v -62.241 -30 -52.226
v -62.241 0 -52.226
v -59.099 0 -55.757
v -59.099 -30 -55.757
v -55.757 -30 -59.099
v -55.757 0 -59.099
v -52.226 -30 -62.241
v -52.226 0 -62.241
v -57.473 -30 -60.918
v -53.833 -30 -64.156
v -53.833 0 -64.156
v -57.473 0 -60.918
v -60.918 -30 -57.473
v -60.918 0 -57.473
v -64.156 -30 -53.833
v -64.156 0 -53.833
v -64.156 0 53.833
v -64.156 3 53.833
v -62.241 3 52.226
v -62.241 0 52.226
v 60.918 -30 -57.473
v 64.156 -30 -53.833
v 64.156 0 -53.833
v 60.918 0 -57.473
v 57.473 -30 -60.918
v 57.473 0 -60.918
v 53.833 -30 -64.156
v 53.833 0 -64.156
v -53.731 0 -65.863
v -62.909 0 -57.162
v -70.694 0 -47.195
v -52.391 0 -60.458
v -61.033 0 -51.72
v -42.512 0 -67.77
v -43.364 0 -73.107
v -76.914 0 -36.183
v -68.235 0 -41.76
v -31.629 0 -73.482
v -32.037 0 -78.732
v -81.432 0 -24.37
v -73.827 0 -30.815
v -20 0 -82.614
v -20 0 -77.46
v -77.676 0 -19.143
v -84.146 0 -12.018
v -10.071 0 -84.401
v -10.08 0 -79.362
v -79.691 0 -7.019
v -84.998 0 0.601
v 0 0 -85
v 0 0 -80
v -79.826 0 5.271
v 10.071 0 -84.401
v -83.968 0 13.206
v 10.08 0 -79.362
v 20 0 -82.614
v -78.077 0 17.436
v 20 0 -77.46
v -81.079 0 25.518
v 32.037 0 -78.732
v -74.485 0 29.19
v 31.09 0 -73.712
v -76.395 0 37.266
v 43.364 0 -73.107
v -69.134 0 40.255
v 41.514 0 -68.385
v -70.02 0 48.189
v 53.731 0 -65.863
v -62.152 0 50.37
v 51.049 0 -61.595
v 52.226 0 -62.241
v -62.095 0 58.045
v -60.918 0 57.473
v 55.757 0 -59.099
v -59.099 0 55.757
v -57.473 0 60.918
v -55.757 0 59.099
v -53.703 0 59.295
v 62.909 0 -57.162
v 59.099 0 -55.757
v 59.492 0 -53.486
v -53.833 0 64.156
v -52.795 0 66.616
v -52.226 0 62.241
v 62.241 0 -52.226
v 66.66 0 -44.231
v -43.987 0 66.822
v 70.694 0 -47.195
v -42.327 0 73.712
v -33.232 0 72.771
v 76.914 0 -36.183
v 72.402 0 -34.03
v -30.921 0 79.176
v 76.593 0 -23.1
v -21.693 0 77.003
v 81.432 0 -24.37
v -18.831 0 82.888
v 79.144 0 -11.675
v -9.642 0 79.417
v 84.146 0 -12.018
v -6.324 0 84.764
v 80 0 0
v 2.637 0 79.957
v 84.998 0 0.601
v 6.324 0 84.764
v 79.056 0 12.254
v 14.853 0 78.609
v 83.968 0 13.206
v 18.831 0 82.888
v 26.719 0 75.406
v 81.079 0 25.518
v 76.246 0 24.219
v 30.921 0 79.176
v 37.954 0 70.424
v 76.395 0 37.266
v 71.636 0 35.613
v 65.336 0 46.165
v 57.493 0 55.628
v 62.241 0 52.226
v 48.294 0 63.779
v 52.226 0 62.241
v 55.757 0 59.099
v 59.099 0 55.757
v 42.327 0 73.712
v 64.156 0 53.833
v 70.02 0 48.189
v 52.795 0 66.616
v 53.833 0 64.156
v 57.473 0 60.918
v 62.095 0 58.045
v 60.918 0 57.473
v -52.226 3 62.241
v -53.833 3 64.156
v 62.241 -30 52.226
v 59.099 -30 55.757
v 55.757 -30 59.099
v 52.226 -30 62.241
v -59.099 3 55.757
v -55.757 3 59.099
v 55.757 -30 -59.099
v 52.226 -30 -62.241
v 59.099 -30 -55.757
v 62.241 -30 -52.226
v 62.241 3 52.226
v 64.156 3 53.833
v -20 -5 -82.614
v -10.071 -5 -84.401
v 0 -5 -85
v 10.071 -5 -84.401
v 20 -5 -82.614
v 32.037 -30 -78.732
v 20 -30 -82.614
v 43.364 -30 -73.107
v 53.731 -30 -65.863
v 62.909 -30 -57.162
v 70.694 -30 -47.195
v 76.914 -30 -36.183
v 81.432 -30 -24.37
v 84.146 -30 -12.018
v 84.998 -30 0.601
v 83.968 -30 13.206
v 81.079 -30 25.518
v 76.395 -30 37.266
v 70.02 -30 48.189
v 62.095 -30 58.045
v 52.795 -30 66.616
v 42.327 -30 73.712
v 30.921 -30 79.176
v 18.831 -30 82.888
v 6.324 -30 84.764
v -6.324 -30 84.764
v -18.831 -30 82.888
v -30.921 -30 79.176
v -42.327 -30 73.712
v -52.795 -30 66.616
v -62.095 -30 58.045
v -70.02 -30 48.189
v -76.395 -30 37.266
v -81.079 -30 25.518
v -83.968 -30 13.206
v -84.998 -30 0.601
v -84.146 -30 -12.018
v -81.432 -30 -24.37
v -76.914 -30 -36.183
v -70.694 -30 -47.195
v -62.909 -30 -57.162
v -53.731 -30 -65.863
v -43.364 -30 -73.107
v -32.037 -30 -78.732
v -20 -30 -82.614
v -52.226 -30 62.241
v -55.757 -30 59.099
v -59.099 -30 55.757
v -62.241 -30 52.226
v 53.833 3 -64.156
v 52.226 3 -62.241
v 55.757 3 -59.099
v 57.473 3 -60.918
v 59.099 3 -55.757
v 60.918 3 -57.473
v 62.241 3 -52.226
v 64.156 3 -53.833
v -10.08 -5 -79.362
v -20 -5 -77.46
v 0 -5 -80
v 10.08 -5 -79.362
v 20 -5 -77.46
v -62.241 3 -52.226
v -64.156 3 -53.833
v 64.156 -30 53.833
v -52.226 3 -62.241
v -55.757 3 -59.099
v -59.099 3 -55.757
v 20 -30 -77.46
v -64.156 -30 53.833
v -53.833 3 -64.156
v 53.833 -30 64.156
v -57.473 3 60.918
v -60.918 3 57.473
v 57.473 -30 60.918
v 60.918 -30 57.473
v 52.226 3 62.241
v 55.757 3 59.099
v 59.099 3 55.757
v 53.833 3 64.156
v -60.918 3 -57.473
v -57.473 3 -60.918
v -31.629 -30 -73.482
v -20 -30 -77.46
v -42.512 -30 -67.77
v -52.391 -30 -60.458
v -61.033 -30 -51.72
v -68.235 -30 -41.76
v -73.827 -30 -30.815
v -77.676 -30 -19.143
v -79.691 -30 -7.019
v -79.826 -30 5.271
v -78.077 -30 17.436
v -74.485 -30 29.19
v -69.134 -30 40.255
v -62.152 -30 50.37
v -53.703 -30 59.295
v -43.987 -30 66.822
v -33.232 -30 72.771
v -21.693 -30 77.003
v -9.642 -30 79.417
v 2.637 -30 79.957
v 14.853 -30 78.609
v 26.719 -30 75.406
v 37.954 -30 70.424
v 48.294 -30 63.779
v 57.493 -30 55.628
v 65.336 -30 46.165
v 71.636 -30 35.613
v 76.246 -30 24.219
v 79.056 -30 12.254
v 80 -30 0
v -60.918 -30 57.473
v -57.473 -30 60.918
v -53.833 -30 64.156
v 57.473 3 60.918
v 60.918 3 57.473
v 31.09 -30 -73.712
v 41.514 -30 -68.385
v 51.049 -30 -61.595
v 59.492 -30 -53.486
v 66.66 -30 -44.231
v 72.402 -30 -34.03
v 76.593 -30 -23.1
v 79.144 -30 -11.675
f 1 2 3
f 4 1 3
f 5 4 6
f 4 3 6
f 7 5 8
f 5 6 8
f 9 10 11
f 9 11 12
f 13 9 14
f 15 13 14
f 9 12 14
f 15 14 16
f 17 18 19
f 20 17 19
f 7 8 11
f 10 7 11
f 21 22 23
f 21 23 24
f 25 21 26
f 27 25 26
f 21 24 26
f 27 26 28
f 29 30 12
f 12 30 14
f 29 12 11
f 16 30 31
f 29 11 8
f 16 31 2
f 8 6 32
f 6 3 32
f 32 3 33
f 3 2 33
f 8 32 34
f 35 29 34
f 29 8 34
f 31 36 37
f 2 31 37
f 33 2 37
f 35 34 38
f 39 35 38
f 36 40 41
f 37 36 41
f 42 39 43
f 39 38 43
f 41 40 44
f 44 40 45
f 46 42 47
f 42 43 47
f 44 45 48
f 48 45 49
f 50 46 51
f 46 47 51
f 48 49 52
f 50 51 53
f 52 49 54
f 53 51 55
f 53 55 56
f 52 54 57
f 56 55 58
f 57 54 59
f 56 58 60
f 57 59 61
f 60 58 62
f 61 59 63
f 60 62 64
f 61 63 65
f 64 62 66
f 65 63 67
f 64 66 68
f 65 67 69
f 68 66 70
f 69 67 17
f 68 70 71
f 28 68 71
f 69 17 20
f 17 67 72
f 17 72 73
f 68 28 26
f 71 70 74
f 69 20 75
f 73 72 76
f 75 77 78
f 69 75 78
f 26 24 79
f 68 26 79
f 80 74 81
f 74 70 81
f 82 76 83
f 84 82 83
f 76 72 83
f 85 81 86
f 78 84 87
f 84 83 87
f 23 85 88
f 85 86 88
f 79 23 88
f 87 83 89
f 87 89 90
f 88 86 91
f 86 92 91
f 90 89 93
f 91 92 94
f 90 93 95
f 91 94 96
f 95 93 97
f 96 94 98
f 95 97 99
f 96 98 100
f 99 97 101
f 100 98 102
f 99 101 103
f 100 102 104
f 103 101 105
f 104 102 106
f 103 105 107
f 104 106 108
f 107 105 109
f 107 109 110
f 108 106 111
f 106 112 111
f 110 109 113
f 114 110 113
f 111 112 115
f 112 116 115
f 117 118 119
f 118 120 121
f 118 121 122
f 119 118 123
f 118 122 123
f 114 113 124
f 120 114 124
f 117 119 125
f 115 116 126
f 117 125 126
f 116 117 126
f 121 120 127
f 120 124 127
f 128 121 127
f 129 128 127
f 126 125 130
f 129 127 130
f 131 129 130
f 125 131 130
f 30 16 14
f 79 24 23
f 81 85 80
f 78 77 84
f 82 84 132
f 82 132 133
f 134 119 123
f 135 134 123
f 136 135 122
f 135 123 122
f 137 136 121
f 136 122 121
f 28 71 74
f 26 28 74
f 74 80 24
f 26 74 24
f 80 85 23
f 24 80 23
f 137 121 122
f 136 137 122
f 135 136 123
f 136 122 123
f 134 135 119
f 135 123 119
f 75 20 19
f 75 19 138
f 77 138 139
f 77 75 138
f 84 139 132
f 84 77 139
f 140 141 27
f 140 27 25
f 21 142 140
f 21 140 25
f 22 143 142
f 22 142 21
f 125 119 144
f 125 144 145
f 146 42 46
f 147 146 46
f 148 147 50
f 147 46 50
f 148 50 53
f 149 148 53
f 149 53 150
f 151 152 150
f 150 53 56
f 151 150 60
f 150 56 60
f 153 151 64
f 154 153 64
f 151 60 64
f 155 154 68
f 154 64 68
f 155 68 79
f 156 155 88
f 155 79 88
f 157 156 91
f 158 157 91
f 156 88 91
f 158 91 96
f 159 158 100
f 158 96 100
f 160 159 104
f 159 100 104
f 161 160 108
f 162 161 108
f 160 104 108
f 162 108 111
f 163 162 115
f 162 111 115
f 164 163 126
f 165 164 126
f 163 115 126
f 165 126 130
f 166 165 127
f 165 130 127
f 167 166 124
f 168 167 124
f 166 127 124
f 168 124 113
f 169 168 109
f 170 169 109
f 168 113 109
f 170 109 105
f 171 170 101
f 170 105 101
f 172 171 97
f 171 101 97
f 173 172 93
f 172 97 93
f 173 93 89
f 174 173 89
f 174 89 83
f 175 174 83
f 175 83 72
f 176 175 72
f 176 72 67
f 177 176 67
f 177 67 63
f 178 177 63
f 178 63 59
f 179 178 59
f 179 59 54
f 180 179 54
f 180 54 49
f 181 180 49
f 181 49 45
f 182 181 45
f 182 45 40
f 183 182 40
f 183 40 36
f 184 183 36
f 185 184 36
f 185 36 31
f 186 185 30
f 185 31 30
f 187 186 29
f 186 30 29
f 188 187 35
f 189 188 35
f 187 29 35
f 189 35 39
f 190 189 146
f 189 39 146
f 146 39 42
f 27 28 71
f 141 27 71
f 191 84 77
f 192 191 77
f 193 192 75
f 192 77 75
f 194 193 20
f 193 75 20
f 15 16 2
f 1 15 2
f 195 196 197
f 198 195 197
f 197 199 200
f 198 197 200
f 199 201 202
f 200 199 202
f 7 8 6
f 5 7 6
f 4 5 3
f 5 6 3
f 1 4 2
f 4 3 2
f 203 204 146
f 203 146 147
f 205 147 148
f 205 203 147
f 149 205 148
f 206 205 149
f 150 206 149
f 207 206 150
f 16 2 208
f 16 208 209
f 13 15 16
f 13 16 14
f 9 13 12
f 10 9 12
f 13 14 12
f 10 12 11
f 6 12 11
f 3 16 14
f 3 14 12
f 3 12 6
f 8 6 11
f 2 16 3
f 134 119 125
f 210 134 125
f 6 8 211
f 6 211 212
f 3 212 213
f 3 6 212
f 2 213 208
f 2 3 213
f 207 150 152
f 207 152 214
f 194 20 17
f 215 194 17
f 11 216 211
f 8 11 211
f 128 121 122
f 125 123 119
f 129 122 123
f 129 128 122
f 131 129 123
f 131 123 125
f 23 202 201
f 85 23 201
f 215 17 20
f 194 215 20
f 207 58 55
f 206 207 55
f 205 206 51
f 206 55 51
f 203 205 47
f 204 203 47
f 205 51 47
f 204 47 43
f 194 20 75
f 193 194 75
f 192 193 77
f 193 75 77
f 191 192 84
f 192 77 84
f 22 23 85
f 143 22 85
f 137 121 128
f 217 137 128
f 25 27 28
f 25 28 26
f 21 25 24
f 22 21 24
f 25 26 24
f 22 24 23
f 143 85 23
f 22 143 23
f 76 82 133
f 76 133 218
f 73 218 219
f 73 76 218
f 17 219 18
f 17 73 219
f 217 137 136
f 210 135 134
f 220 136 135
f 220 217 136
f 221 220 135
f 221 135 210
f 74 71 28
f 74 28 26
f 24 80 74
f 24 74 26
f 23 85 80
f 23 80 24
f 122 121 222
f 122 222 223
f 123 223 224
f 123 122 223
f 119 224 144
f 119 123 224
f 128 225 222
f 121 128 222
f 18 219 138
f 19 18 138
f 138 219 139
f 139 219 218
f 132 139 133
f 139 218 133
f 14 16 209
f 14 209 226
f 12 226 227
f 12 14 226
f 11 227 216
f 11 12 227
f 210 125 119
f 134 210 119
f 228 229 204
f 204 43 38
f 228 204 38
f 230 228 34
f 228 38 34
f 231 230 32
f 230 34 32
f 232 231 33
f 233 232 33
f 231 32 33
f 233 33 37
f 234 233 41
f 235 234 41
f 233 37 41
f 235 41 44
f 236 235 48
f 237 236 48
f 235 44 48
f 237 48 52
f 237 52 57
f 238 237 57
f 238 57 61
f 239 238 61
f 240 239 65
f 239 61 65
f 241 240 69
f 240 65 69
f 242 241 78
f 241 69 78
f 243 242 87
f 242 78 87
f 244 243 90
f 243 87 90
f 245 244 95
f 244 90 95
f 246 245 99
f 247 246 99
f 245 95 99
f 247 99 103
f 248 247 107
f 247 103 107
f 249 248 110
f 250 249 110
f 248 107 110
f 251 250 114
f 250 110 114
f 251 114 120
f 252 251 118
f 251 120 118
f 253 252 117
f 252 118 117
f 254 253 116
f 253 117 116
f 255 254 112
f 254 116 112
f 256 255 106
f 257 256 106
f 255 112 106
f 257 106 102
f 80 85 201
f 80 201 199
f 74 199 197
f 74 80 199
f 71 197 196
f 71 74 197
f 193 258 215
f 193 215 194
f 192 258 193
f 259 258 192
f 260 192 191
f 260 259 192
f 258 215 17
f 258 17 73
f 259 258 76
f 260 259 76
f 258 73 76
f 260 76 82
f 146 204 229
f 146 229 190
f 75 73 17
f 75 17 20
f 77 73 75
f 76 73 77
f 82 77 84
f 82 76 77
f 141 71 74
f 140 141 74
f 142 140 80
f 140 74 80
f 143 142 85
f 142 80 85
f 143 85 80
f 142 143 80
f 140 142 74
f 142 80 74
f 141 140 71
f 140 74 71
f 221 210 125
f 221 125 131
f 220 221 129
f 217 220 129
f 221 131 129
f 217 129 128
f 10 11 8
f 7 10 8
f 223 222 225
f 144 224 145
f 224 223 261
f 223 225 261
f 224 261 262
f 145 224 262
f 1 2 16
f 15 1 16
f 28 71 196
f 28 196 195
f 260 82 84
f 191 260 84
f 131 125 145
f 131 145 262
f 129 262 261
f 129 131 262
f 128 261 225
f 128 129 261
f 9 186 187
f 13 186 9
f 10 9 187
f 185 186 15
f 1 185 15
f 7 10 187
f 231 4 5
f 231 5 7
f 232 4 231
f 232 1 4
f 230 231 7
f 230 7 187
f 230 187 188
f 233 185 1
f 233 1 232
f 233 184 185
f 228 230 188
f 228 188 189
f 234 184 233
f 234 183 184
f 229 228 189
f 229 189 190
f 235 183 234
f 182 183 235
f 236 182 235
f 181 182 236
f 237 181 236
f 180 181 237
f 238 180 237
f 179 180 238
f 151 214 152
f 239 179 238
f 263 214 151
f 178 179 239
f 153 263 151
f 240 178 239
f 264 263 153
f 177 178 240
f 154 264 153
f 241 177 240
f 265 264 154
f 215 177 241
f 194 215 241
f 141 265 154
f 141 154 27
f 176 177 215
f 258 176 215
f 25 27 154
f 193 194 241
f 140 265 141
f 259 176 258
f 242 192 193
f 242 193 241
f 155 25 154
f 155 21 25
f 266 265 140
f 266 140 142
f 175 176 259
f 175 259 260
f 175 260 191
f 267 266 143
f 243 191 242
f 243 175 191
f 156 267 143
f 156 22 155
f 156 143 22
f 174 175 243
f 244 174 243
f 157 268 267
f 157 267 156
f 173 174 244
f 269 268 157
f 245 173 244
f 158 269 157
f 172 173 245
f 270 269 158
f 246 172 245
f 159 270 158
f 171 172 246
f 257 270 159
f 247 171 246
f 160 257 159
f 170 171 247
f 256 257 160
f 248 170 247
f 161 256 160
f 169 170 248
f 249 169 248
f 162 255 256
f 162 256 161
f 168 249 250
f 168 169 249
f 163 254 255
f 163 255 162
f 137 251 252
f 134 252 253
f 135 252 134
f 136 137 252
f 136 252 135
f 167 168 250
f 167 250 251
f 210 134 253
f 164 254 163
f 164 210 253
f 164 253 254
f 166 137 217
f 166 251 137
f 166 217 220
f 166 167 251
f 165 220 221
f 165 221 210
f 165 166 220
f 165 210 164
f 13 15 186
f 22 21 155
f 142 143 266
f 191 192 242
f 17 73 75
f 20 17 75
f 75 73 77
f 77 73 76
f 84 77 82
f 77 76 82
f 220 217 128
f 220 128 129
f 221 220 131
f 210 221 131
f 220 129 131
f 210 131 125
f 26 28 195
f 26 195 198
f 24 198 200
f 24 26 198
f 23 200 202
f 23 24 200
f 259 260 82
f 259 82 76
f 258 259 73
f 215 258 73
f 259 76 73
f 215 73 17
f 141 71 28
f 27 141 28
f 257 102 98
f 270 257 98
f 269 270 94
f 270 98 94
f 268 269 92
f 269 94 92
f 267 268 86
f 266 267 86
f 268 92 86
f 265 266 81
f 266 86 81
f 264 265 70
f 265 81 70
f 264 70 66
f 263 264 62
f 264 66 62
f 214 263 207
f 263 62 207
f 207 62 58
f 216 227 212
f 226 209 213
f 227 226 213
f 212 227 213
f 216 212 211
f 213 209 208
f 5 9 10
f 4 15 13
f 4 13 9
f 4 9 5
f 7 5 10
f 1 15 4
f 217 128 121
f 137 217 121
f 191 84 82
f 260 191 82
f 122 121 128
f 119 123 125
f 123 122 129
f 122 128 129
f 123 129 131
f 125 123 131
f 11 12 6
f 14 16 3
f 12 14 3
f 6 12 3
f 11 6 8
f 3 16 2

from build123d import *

# Parameters (mm, degrees)
F1_DEPTH = 30
F2_DEPTH = 3
F3_DEPTH = 30
F4_DEPTH = 30
F5_DEPTH = 5


with BuildPart() as f1:
    # F0 (on Front) → F1 (new body)
    with BuildSketch(Plane.XZ):
        with BuildLine():
            ThreePointArc((-20, -77.4596669241), (-48.9897948557, 63.2455532034), (80, 0))
            ThreePointArc((80, 0), (63.2455532034, -48.9897948557), (20, -77.4596669241))
            Line((20, -77.4596669241), (20, -82.6135582093))
            ThreePointArc((20, -82.6135582093), (66.8019460794, -52.5594901041), (85, 0))
            ThreePointArc((85, 0), (-52.5594901041, 66.8019460794), (-20, -82.6135582093))
            Line((-20, -82.6135582093), (-20, -77.4596669241))
        make_face()
        with BuildLine():
            ThreePointArc((-53.8334623112, -64.1562221112), (-59.2201929244, -59.2201929244), (-64.1562221112, -53.8334623112))
            Line((-64.1562221112, -53.8334623112), (-62.2411110034, -52.226493287))
            ThreePointArc((-62.2411110034, -52.226493287), (-57.4524259714, -57.4524259714), (-52.226493287, -62.2411110034))
            Line((-52.226493287, -62.2411110034), (-53.8334623112, -64.1562221112))
        make_face(mode=Mode.SUBTRACT)
        with BuildLine():
            Line((53.8334623112, -64.1562221112), (52.226493287, -62.2411110034))
            ThreePointArc((52.226493287, -62.2411110034), (57.4524259714, -57.4524259714), (62.2411110034, -52.226493287))
            Line((62.2411110034, -52.226493287), (64.1562221112, -53.8334623112))
            ThreePointArc((64.1562221112, -53.8334623112), (59.2201929244, -59.2201929244), (53.8334623112, -64.1562221112))
        make_face(mode=Mode.SUBTRACT)
        with BuildLine():
            ThreePointArc((-64.1562221112, 53.8334623112), (-59.2201929244, 59.2201929244), (-53.8334623112, 64.1562221112))
            Line((-53.8334623112, 64.1562221112), (-52.226493287, 62.2411110034))
            ThreePointArc((-52.226493287, 62.2411110034), (-57.4524259714, 57.4524259714), (-62.2411110034, 52.226493287))
            Line((-62.2411110034, 52.226493287), (-64.1562221112, 53.8334623112))
        make_face(mode=Mode.SUBTRACT)
        with BuildLine():
            ThreePointArc((53.8334623112, 64.1562221112), (59.2201929244, 59.2201929244), (64.1562221112, 53.8334623112))
            Line((64.1562221112, 53.8334623112), (62.2411110034, 52.226493287))
            ThreePointArc((62.2411110034, 52.226493287), (57.4524259714, 57.4524259714), (52.226493287, 62.2411110034))
            Line((52.226493287, 62.2411110034), (53.8334623112, 64.1562221112))
        make_face(mode=Mode.SUBTRACT)
        with BuildLine():
            ThreePointArc((20, -77.4596669241), (0, -80), (-20, -77.4596669241))
            Line((-20, -77.4596669241), (-20, -82.6135582093))
            ThreePointArc((-20, -82.6135582093), (0, -85), (20, -82.6135582093))
            Line((20, -82.6135582093), (20, -77.4596669241))
        make_face()
    extrude(amount=F1_DEPTH)

    # F0 (on Front) → F4 (cut)
    with BuildSketch(Plane.XZ):
        with BuildLine():
            ThreePointArc((20, -77.4596669241), (0, -80), (-20, -77.4596669241))
            Line((-20, -77.4596669241), (-20, -82.6135582093))
            ThreePointArc((-20, -82.6135582093), (0, -85), (20, -82.6135582093))
            Line((20, -82.6135582093), (20, -77.4596669241))
        make_face()
    extrude(amount=F4_DEPTH, mode=Mode.SUBTRACT)

    # F0 (on Front) → F5 (join)
    with BuildSketch(Plane.XZ):
        with BuildLine():
            ThreePointArc((20, -77.4596669241), (0, -80), (-20, -77.4596669241))
            Line((-20, -77.4596669241), (-20, -82.6135582093))
            ThreePointArc((-20, -82.6135582093), (0, -85), (20, -82.6135582093))
            Line((20, -82.6135582093), (20, -77.4596669241))
        make_face()
    extrude(amount=F5_DEPTH)


with BuildPart() as f2:
    # F0 (on Front) → F2 (new body)
    with BuildSketch(Plane.XZ):
        with BuildLine():
            Line((-52.226493287, 62.2411110034), (-53.8334623112, 64.1562221112))
            ThreePointArc((-53.8334623112, 64.1562221112), (-59.2201929244, 59.2201929244), (-64.1562221112, 53.8334623112))
            Line((-64.1562221112, 53.8334623112), (-62.2411110034, 52.226493287))
            ThreePointArc((-62.2411110034, 52.226493287), (-57.4524259714, 57.4524259714), (-52.226493287, 62.2411110034))
        make_face()
    extrude(amount=-F2_DEPTH)


with BuildPart() as f2b:
    # F0 (on Front) → F2, piece 2 (new body)
    with BuildSketch(Plane.XZ):
        with BuildLine():
            Line((62.2411110034, 52.226493287), (64.1562221112, 53.8334623112))
            ThreePointArc((64.1562221112, 53.8334623112), (59.2201929244, 59.2201929244), (53.8334623112, 64.1562221112))
            Line((53.8334623112, 64.1562221112), (52.226493287, 62.2411110034))
            ThreePointArc((52.226493287, 62.2411110034), (57.4524259714, 57.4524259714), (62.2411110034, 52.226493287))
        make_face()
    extrude(amount=-F2_DEPTH)


with BuildPart() as f2c:
    # F0 (on Front) → F2, piece 3 (new body)
    with BuildSketch(Plane.XZ):
        with BuildLine():
            ThreePointArc((62.2411110034, -52.226493287), (57.4524259714, -57.4524259714), (52.226493287, -62.2411110034))
            Line((52.226493287, -62.2411110034), (53.8334623112, -64.1562221112))
            ThreePointArc((53.8334623112, -64.1562221112), (59.2201929244, -59.2201929244), (64.1562221112, -53.8334623112))
            Line((64.1562221112, -53.8334623112), (62.2411110034, -52.226493287))
        make_face()
    extrude(amount=-F2_DEPTH)


with BuildPart() as f2d:
    # F0 (on Front) → F2, piece 4 (new body)
    with BuildSketch(Plane.XZ):
        with BuildLine():
            Line((-62.2411110034, -52.226493287), (-64.1562221112, -53.8334623112))
            ThreePointArc((-64.1562221112, -53.8334623112), (-59.2201929244, -59.2201929244), (-53.8334623112, -64.1562221112))
            Line((-53.8334623112, -64.1562221112), (-52.226493287, -62.2411110034))
            ThreePointArc((-52.226493287, -62.2411110034), (-57.4524259714, -57.4524259714), (-62.2411110034, -52.226493287))
        make_face()
    extrude(amount=-F2_DEPTH)


with BuildPart() as f3:
    # F0 (on Front) → F3 (new body)
    with BuildSketch(Plane.XZ):
        with BuildLine():
            Line((-52.226493287, 62.2411110034), (-53.8334623112, 64.1562221112))
            ThreePointArc((-53.8334623112, 64.1562221112), (-59.2201929244, 59.2201929244), (-64.1562221112, 53.8334623112))
            Line((-64.1562221112, 53.8334623112), (-62.2411110034, 52.226493287))
            ThreePointArc((-62.2411110034, 52.226493287), (-57.4524259714, 57.4524259714), (-52.226493287, 62.2411110034))
        make_face()
    extrude(amount=F3_DEPTH)


with BuildPart() as f3b:
    # F0 (on Front) → F3, piece 2 (new body)
    with BuildSketch(Plane.XZ):
        with BuildLine():
            Line((-62.2411110034, -52.226493287), (-64.1562221112, -53.8334623112))
            ThreePointArc((-64.1562221112, -53.8334623112), (-59.2201929244, -59.2201929244), (-53.8334623112, -64.1562221112))
            Line((-53.8334623112, -64.1562221112), (-52.226493287, -62.2411110034))
            ThreePointArc((-52.226493287, -62.2411110034), (-57.4524259714, -57.4524259714), (-62.2411110034, -52.226493287))
        make_face()
    extrude(amount=F3_DEPTH)


with BuildPart() as f3c:
    # F0 (on Front) → F3, piece 3 (new body)
    with BuildSketch(Plane.XZ):
        with BuildLine():
            ThreePointArc((62.2411110034, -52.226493287), (57.4524259714, -57.4524259714), (52.226493287, -62.2411110034))
            Line((52.226493287, -62.2411110034), (53.8334623112, -64.1562221112))
            ThreePointArc((53.8334623112, -64.1562221112), (59.2201929244, -59.2201929244), (64.1562221112, -53.8334623112))
            Line((64.1562221112, -53.8334623112), (62.2411110034, -52.226493287))
        make_face()
    extrude(amount=F3_DEPTH)


with BuildPart() as f3d:
    # F0 (on Front) → F3, piece 4 (new body)
    with BuildSketch(Plane.XZ):
        with BuildLine():
            Line((62.2411110034, 52.226493287), (64.1562221112, 53.8334623112))
            ThreePointArc((64.1562221112, 53.8334623112), (59.2201929244, 59.2201929244), (53.8334623112, 64.1562221112))
            Line((53.8334623112, 64.1562221112), (52.226493287, 62.2411110034))
            ThreePointArc((52.226493287, 62.2411110034), (57.4524259714, 57.4524259714), (62.2411110034, 52.226493287))
        make_face()
    extrude(amount=F3_DEPTH)


solid = Compound([f1.part, f2.part, f2b.part, f2c.part, f2d.part, f3.part, f3b.part, f3c.part, f3d.part])
